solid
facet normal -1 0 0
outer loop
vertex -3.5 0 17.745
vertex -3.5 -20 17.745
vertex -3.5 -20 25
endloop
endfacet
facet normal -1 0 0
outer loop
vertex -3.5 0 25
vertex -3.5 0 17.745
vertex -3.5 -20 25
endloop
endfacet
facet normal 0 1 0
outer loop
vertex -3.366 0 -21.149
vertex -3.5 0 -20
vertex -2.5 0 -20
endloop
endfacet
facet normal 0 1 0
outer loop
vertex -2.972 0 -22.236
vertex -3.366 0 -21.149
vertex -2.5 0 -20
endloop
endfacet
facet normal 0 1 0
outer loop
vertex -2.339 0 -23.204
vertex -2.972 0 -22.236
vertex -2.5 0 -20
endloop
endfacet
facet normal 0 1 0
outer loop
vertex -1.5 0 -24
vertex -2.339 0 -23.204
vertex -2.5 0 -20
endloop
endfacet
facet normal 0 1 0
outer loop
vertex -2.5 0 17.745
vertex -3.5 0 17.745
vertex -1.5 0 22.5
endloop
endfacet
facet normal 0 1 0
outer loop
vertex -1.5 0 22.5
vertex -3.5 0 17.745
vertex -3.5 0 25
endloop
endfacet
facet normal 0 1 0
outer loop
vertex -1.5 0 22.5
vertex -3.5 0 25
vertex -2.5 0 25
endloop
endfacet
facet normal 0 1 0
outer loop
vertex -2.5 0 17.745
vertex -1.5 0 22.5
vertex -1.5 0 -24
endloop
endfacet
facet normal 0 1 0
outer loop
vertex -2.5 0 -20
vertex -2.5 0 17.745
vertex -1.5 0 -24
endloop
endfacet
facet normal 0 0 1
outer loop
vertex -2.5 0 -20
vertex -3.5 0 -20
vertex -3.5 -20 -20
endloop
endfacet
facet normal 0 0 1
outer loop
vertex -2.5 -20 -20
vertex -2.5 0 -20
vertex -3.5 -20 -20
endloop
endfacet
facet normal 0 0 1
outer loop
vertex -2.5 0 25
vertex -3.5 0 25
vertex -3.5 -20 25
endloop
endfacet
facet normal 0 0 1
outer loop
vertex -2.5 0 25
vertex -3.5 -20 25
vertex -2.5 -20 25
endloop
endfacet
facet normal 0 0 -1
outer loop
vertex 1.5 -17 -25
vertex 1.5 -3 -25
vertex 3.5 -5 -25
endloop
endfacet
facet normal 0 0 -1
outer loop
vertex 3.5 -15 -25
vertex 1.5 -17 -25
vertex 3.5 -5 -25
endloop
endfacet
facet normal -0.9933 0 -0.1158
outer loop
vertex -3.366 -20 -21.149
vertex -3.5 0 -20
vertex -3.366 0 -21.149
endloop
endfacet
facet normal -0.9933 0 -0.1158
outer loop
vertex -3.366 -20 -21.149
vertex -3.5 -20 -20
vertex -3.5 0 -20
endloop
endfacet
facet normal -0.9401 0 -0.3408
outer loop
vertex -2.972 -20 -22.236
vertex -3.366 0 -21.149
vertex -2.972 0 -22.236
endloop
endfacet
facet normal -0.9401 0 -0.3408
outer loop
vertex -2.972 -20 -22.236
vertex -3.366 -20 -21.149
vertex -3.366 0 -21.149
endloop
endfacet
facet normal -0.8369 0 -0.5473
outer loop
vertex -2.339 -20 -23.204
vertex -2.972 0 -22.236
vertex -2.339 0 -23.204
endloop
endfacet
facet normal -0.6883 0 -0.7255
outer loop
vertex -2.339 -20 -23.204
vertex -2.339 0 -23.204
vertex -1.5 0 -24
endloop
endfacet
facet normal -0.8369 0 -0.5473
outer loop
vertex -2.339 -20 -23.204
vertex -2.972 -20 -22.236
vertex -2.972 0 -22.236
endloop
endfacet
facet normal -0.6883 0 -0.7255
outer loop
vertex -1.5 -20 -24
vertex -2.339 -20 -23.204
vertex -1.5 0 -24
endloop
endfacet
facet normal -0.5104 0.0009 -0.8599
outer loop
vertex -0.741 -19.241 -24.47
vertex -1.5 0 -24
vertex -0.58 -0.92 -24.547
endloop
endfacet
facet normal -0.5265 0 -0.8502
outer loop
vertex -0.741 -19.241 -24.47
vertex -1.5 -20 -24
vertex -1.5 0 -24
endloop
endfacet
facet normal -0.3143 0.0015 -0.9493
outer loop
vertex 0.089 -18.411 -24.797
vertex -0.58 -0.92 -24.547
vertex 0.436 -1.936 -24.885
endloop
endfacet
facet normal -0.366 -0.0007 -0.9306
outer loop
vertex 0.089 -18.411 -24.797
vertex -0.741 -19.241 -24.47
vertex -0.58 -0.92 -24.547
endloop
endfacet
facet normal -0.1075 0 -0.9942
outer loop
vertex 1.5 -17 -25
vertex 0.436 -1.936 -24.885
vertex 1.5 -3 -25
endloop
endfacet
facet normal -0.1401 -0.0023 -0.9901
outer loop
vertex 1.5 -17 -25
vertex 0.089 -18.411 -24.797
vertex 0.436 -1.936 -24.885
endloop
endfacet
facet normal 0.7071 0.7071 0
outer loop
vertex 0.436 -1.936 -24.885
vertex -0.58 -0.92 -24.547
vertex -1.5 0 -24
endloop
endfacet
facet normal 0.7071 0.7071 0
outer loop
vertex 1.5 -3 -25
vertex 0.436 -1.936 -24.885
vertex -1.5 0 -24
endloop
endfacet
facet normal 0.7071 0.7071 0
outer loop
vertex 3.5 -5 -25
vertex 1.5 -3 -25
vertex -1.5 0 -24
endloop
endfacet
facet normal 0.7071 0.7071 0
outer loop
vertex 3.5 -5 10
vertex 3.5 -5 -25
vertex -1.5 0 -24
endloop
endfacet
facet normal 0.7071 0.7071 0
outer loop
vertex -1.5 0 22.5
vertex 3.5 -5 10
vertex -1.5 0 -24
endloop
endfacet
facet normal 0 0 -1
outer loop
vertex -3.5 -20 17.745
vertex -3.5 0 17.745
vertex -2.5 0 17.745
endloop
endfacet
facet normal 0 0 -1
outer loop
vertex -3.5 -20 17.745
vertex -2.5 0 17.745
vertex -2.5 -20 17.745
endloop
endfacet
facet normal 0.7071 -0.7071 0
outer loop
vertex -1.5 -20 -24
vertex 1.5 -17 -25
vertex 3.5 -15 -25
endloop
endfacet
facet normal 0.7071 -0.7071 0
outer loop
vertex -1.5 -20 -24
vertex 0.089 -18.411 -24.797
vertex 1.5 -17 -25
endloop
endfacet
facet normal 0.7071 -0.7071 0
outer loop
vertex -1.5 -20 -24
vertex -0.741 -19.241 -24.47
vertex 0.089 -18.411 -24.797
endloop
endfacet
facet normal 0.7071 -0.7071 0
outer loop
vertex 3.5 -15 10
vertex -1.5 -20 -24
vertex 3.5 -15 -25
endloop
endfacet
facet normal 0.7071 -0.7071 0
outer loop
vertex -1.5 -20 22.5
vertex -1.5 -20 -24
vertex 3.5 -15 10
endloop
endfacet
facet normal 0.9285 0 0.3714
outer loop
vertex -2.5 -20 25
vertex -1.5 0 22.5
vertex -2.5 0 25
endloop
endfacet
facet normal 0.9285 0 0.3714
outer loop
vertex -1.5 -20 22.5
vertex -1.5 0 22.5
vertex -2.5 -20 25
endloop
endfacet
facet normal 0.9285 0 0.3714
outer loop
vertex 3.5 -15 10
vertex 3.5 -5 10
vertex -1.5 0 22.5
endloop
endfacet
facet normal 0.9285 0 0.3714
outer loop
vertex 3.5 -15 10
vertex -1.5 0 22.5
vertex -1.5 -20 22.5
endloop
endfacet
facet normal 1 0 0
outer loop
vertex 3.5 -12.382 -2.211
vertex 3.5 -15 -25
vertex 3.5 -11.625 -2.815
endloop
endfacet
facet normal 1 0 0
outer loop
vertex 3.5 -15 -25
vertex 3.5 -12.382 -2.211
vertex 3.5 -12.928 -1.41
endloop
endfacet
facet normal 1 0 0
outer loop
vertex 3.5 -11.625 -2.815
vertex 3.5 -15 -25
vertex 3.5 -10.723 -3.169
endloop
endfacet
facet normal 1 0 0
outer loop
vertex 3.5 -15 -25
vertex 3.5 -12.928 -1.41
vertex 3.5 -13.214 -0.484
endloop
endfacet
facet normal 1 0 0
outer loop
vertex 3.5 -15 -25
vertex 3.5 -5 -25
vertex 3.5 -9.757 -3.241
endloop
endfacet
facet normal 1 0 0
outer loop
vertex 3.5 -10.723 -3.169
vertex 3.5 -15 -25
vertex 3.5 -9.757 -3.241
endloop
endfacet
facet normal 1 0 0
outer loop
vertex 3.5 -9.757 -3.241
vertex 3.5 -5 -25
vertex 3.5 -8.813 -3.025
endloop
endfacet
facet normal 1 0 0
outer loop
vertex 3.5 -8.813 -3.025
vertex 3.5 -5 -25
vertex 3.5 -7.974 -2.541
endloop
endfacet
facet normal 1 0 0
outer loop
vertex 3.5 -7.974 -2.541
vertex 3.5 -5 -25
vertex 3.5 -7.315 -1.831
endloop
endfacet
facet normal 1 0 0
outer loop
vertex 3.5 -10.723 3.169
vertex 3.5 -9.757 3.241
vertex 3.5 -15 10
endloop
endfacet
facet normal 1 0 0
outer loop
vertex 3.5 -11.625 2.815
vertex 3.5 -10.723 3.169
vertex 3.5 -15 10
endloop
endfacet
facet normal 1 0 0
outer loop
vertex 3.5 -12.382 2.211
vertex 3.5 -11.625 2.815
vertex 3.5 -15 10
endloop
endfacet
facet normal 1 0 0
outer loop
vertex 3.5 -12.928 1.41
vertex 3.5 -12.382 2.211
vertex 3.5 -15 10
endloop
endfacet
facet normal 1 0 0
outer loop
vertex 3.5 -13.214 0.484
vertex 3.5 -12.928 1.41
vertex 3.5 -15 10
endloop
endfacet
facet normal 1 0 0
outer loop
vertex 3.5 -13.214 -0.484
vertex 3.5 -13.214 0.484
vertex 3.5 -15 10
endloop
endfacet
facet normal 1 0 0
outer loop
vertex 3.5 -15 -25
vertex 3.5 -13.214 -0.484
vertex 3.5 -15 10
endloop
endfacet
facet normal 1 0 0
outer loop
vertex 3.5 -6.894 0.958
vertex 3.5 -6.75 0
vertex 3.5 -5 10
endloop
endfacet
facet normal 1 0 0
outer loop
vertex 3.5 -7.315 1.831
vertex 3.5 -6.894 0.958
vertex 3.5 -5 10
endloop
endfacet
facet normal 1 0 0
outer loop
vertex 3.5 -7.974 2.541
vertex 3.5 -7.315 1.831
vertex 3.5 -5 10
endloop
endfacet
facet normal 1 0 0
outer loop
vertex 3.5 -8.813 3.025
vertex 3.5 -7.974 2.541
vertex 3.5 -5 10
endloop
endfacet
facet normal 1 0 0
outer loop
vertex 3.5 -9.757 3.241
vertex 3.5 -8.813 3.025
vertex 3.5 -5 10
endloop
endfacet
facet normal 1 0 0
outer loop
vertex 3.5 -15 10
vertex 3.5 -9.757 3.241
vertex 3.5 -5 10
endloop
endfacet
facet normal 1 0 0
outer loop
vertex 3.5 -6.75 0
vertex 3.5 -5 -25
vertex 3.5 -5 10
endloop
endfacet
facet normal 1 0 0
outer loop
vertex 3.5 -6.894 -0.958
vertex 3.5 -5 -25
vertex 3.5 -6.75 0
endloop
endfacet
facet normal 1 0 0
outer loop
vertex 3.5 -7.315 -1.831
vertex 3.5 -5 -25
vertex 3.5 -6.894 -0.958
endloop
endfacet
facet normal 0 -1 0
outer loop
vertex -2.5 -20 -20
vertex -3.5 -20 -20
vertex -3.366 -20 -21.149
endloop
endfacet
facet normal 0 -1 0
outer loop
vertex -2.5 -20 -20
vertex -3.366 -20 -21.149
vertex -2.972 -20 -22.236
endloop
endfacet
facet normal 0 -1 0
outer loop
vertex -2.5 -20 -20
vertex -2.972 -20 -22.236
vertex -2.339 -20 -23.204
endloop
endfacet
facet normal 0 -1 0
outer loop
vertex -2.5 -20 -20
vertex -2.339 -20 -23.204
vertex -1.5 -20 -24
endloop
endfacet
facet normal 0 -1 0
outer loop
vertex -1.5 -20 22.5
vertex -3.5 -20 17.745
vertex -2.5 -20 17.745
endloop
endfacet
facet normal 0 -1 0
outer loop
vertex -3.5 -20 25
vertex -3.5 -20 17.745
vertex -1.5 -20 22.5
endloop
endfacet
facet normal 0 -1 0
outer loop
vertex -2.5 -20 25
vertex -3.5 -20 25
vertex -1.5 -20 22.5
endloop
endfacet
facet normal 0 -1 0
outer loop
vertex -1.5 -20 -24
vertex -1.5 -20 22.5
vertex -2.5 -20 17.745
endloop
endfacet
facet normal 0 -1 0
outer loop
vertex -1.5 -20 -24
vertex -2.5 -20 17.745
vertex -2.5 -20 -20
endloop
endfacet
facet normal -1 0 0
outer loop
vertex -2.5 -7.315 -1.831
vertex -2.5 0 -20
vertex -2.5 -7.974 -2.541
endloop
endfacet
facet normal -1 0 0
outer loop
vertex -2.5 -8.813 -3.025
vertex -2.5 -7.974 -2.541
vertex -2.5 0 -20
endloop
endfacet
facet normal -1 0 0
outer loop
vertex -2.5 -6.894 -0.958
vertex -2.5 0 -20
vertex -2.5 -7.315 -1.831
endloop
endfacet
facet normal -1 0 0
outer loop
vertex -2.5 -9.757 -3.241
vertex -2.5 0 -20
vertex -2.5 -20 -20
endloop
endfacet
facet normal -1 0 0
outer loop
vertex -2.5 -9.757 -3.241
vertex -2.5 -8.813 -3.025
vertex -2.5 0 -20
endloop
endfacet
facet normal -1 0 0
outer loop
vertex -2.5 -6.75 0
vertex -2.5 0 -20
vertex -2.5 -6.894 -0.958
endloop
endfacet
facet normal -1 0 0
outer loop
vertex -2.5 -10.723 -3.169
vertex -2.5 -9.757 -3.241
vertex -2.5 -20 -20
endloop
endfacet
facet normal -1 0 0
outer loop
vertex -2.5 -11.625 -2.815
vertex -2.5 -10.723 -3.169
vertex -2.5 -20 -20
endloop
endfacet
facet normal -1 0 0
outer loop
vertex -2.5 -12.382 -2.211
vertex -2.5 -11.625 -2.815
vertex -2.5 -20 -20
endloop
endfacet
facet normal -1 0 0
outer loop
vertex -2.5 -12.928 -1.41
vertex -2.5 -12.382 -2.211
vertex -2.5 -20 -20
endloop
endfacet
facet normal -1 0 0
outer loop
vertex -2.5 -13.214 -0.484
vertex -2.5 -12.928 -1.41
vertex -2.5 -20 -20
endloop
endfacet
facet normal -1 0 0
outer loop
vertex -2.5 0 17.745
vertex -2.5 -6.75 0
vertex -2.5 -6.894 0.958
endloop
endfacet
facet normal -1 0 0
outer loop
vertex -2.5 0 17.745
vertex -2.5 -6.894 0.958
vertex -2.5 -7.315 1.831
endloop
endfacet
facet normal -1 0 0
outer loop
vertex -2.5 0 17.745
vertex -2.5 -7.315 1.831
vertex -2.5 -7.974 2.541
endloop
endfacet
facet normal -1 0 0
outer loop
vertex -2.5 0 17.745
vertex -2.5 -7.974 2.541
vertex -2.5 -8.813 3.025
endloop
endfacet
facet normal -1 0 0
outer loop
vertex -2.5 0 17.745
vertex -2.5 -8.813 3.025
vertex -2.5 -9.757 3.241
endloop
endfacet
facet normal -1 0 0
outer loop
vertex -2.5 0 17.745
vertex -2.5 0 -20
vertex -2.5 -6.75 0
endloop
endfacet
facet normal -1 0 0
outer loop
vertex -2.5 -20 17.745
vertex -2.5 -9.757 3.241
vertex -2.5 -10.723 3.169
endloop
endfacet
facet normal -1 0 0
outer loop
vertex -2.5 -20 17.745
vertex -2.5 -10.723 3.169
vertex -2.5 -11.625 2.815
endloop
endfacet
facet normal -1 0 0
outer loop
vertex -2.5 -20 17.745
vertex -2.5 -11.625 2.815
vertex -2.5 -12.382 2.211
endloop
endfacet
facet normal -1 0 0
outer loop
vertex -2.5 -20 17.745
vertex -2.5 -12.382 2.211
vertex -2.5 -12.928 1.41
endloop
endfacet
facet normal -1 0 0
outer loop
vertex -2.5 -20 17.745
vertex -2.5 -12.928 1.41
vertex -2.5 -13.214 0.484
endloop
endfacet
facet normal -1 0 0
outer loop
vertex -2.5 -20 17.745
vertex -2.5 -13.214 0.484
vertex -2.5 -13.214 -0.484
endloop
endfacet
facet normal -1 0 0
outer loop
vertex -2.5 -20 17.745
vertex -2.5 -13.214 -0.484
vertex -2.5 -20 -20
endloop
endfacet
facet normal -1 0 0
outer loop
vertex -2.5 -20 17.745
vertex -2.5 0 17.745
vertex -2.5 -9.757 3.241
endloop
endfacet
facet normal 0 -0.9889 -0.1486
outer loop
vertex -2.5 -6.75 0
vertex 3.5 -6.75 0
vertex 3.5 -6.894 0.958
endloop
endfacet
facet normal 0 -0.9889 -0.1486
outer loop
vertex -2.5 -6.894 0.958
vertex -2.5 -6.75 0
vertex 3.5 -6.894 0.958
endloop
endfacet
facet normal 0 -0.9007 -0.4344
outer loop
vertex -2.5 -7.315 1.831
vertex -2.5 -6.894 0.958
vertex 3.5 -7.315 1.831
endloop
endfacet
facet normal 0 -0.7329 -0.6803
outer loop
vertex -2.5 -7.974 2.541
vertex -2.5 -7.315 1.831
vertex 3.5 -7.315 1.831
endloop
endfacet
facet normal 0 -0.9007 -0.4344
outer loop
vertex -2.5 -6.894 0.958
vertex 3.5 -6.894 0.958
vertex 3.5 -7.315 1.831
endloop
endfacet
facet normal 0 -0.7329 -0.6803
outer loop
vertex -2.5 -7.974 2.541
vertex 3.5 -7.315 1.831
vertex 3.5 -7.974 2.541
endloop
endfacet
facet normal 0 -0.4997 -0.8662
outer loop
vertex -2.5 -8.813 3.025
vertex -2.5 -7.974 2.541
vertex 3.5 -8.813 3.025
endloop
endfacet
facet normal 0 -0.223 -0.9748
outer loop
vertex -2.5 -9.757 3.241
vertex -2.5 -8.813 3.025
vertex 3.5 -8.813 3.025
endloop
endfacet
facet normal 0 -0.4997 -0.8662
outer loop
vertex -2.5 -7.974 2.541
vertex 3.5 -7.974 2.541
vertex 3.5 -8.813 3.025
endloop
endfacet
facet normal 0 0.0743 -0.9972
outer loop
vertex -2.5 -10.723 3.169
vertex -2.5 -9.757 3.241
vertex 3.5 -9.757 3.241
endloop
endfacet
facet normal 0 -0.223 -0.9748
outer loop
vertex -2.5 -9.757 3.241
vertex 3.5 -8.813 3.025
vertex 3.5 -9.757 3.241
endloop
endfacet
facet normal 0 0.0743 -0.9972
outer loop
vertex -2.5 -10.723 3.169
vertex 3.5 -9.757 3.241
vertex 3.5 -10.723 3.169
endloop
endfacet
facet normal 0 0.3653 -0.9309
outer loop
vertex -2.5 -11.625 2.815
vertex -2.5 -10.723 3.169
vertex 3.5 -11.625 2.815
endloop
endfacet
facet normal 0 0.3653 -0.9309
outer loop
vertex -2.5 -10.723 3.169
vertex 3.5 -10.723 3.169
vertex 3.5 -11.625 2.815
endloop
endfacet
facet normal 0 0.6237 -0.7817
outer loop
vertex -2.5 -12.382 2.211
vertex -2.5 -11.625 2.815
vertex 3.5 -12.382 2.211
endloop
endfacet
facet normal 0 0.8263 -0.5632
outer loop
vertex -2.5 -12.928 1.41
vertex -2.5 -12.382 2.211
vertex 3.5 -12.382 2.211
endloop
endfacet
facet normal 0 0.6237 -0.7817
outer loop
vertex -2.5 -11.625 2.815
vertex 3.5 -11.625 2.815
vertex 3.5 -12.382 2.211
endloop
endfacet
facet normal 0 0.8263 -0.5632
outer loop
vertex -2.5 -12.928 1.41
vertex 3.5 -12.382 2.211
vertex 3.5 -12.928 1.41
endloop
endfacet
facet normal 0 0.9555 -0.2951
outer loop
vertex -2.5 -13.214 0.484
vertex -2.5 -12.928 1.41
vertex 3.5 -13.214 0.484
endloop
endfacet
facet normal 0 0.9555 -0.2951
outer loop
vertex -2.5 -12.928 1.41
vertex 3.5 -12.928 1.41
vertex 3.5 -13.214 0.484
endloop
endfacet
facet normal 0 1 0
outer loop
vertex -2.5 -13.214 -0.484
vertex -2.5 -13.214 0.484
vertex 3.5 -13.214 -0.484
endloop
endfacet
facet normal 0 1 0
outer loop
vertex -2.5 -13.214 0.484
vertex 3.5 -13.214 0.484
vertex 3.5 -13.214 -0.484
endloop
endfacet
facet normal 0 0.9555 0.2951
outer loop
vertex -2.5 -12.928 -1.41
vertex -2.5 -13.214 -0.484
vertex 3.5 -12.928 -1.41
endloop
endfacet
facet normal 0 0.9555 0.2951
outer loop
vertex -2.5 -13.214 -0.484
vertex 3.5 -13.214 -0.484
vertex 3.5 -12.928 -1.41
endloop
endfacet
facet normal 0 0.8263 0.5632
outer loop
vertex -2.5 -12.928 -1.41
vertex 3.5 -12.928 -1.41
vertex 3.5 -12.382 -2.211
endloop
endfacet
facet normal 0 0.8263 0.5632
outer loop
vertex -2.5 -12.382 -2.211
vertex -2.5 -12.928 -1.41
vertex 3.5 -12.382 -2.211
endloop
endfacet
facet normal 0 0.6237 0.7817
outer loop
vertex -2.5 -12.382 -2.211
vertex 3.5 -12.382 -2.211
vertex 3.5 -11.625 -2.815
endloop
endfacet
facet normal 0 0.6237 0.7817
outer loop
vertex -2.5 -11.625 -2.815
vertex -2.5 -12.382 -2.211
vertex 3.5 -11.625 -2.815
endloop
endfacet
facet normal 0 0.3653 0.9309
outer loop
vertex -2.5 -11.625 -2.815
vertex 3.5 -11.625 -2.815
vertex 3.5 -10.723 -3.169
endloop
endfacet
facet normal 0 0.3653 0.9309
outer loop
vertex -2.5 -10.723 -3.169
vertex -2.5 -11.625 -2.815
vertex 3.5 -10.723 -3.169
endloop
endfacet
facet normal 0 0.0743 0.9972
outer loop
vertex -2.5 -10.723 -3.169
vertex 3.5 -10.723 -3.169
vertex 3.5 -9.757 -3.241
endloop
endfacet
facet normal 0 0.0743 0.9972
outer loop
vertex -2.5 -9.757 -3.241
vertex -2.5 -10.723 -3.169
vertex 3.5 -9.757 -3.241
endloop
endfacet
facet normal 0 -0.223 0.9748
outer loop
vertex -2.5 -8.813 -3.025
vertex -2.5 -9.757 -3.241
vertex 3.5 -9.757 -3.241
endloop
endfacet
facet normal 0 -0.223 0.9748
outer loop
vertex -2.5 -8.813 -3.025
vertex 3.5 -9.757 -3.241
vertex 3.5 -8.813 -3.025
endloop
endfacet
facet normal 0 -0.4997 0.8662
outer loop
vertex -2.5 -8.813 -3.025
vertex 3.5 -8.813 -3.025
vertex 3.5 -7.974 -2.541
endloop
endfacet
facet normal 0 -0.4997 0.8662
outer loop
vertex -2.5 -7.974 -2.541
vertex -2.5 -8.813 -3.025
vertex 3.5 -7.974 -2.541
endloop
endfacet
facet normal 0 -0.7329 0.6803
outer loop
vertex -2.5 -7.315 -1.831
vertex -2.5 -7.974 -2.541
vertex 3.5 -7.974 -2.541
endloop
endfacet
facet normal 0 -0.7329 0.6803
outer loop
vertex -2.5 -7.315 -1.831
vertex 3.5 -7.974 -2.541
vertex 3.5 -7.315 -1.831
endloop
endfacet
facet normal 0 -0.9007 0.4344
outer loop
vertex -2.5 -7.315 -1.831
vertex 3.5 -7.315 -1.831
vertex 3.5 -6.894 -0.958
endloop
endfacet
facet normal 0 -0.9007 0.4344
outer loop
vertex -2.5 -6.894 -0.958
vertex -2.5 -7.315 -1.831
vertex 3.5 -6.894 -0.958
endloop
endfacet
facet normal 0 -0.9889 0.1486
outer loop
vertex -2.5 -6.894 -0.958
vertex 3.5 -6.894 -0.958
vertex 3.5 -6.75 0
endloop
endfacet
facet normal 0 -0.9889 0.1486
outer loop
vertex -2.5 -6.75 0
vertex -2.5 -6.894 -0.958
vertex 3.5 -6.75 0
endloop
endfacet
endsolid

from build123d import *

# Parameters (mm, degrees)
F0_W     = 7
F0_H     = 50
F1_DEPTH = 20
F2_R     = 5
F3_W     = 20
F3_H     = 37.745
F4_DEPTH = 1
F5_SIZE2 = 15
F5_SIZE  = 6
F6_R     = 3.25
F7_DEPTH = 25
F8_SIZE  = 5


with BuildPart() as f1:
    # F0 (on Front) → F1 (new body)
    with BuildSketch(Plane.XZ):
        Rectangle(F0_W, F0_H)
    extrude(amount=F1_DEPTH)

    # F2
    f2_edges = [f1.edges().sort_by_distance(p)[0] for p in [
        (-3.5, -10, -25),
    ]]
    fillet(f2_edges, radius=F2_R)

    # F3 (on face) → F4 (cut)
    with BuildSketch(Plane(origin=(-3.5, 0, 0), x_dir=(0, -1, 0), z_dir=(-1, 0, 0))):
        with Locations((10, -1.1275)):
            Rectangle(F3_W, F3_H)
    extrude(amount=-F4_DEPTH, mode=Mode.SUBTRACT)

    # F5
    f5_edges = [f1.edges().sort_by_distance(p)[0] for p in [
        (3.5, -10, 25),
    ]]
    chamfer(f5_edges, length=F5_SIZE, length2=F5_SIZE2)

    # F6 (on face) → F7 (cut)
    with BuildSketch(Plane.YZ.offset(3.5)):
        with Locations((-10, 0)):
            Circle(F6_R)
    extrude(amount=-F7_DEPTH, mode=Mode.SUBTRACT)

    # F8
    f8_edges = [f1.edges().sort_by_distance(p)[0] for p in [
        (3.5, -20, -7.5),
        (3.5, 0, -7.5),
    ]]
    chamfer(f8_edges, length=F8_SIZE)


solid = f1.part
